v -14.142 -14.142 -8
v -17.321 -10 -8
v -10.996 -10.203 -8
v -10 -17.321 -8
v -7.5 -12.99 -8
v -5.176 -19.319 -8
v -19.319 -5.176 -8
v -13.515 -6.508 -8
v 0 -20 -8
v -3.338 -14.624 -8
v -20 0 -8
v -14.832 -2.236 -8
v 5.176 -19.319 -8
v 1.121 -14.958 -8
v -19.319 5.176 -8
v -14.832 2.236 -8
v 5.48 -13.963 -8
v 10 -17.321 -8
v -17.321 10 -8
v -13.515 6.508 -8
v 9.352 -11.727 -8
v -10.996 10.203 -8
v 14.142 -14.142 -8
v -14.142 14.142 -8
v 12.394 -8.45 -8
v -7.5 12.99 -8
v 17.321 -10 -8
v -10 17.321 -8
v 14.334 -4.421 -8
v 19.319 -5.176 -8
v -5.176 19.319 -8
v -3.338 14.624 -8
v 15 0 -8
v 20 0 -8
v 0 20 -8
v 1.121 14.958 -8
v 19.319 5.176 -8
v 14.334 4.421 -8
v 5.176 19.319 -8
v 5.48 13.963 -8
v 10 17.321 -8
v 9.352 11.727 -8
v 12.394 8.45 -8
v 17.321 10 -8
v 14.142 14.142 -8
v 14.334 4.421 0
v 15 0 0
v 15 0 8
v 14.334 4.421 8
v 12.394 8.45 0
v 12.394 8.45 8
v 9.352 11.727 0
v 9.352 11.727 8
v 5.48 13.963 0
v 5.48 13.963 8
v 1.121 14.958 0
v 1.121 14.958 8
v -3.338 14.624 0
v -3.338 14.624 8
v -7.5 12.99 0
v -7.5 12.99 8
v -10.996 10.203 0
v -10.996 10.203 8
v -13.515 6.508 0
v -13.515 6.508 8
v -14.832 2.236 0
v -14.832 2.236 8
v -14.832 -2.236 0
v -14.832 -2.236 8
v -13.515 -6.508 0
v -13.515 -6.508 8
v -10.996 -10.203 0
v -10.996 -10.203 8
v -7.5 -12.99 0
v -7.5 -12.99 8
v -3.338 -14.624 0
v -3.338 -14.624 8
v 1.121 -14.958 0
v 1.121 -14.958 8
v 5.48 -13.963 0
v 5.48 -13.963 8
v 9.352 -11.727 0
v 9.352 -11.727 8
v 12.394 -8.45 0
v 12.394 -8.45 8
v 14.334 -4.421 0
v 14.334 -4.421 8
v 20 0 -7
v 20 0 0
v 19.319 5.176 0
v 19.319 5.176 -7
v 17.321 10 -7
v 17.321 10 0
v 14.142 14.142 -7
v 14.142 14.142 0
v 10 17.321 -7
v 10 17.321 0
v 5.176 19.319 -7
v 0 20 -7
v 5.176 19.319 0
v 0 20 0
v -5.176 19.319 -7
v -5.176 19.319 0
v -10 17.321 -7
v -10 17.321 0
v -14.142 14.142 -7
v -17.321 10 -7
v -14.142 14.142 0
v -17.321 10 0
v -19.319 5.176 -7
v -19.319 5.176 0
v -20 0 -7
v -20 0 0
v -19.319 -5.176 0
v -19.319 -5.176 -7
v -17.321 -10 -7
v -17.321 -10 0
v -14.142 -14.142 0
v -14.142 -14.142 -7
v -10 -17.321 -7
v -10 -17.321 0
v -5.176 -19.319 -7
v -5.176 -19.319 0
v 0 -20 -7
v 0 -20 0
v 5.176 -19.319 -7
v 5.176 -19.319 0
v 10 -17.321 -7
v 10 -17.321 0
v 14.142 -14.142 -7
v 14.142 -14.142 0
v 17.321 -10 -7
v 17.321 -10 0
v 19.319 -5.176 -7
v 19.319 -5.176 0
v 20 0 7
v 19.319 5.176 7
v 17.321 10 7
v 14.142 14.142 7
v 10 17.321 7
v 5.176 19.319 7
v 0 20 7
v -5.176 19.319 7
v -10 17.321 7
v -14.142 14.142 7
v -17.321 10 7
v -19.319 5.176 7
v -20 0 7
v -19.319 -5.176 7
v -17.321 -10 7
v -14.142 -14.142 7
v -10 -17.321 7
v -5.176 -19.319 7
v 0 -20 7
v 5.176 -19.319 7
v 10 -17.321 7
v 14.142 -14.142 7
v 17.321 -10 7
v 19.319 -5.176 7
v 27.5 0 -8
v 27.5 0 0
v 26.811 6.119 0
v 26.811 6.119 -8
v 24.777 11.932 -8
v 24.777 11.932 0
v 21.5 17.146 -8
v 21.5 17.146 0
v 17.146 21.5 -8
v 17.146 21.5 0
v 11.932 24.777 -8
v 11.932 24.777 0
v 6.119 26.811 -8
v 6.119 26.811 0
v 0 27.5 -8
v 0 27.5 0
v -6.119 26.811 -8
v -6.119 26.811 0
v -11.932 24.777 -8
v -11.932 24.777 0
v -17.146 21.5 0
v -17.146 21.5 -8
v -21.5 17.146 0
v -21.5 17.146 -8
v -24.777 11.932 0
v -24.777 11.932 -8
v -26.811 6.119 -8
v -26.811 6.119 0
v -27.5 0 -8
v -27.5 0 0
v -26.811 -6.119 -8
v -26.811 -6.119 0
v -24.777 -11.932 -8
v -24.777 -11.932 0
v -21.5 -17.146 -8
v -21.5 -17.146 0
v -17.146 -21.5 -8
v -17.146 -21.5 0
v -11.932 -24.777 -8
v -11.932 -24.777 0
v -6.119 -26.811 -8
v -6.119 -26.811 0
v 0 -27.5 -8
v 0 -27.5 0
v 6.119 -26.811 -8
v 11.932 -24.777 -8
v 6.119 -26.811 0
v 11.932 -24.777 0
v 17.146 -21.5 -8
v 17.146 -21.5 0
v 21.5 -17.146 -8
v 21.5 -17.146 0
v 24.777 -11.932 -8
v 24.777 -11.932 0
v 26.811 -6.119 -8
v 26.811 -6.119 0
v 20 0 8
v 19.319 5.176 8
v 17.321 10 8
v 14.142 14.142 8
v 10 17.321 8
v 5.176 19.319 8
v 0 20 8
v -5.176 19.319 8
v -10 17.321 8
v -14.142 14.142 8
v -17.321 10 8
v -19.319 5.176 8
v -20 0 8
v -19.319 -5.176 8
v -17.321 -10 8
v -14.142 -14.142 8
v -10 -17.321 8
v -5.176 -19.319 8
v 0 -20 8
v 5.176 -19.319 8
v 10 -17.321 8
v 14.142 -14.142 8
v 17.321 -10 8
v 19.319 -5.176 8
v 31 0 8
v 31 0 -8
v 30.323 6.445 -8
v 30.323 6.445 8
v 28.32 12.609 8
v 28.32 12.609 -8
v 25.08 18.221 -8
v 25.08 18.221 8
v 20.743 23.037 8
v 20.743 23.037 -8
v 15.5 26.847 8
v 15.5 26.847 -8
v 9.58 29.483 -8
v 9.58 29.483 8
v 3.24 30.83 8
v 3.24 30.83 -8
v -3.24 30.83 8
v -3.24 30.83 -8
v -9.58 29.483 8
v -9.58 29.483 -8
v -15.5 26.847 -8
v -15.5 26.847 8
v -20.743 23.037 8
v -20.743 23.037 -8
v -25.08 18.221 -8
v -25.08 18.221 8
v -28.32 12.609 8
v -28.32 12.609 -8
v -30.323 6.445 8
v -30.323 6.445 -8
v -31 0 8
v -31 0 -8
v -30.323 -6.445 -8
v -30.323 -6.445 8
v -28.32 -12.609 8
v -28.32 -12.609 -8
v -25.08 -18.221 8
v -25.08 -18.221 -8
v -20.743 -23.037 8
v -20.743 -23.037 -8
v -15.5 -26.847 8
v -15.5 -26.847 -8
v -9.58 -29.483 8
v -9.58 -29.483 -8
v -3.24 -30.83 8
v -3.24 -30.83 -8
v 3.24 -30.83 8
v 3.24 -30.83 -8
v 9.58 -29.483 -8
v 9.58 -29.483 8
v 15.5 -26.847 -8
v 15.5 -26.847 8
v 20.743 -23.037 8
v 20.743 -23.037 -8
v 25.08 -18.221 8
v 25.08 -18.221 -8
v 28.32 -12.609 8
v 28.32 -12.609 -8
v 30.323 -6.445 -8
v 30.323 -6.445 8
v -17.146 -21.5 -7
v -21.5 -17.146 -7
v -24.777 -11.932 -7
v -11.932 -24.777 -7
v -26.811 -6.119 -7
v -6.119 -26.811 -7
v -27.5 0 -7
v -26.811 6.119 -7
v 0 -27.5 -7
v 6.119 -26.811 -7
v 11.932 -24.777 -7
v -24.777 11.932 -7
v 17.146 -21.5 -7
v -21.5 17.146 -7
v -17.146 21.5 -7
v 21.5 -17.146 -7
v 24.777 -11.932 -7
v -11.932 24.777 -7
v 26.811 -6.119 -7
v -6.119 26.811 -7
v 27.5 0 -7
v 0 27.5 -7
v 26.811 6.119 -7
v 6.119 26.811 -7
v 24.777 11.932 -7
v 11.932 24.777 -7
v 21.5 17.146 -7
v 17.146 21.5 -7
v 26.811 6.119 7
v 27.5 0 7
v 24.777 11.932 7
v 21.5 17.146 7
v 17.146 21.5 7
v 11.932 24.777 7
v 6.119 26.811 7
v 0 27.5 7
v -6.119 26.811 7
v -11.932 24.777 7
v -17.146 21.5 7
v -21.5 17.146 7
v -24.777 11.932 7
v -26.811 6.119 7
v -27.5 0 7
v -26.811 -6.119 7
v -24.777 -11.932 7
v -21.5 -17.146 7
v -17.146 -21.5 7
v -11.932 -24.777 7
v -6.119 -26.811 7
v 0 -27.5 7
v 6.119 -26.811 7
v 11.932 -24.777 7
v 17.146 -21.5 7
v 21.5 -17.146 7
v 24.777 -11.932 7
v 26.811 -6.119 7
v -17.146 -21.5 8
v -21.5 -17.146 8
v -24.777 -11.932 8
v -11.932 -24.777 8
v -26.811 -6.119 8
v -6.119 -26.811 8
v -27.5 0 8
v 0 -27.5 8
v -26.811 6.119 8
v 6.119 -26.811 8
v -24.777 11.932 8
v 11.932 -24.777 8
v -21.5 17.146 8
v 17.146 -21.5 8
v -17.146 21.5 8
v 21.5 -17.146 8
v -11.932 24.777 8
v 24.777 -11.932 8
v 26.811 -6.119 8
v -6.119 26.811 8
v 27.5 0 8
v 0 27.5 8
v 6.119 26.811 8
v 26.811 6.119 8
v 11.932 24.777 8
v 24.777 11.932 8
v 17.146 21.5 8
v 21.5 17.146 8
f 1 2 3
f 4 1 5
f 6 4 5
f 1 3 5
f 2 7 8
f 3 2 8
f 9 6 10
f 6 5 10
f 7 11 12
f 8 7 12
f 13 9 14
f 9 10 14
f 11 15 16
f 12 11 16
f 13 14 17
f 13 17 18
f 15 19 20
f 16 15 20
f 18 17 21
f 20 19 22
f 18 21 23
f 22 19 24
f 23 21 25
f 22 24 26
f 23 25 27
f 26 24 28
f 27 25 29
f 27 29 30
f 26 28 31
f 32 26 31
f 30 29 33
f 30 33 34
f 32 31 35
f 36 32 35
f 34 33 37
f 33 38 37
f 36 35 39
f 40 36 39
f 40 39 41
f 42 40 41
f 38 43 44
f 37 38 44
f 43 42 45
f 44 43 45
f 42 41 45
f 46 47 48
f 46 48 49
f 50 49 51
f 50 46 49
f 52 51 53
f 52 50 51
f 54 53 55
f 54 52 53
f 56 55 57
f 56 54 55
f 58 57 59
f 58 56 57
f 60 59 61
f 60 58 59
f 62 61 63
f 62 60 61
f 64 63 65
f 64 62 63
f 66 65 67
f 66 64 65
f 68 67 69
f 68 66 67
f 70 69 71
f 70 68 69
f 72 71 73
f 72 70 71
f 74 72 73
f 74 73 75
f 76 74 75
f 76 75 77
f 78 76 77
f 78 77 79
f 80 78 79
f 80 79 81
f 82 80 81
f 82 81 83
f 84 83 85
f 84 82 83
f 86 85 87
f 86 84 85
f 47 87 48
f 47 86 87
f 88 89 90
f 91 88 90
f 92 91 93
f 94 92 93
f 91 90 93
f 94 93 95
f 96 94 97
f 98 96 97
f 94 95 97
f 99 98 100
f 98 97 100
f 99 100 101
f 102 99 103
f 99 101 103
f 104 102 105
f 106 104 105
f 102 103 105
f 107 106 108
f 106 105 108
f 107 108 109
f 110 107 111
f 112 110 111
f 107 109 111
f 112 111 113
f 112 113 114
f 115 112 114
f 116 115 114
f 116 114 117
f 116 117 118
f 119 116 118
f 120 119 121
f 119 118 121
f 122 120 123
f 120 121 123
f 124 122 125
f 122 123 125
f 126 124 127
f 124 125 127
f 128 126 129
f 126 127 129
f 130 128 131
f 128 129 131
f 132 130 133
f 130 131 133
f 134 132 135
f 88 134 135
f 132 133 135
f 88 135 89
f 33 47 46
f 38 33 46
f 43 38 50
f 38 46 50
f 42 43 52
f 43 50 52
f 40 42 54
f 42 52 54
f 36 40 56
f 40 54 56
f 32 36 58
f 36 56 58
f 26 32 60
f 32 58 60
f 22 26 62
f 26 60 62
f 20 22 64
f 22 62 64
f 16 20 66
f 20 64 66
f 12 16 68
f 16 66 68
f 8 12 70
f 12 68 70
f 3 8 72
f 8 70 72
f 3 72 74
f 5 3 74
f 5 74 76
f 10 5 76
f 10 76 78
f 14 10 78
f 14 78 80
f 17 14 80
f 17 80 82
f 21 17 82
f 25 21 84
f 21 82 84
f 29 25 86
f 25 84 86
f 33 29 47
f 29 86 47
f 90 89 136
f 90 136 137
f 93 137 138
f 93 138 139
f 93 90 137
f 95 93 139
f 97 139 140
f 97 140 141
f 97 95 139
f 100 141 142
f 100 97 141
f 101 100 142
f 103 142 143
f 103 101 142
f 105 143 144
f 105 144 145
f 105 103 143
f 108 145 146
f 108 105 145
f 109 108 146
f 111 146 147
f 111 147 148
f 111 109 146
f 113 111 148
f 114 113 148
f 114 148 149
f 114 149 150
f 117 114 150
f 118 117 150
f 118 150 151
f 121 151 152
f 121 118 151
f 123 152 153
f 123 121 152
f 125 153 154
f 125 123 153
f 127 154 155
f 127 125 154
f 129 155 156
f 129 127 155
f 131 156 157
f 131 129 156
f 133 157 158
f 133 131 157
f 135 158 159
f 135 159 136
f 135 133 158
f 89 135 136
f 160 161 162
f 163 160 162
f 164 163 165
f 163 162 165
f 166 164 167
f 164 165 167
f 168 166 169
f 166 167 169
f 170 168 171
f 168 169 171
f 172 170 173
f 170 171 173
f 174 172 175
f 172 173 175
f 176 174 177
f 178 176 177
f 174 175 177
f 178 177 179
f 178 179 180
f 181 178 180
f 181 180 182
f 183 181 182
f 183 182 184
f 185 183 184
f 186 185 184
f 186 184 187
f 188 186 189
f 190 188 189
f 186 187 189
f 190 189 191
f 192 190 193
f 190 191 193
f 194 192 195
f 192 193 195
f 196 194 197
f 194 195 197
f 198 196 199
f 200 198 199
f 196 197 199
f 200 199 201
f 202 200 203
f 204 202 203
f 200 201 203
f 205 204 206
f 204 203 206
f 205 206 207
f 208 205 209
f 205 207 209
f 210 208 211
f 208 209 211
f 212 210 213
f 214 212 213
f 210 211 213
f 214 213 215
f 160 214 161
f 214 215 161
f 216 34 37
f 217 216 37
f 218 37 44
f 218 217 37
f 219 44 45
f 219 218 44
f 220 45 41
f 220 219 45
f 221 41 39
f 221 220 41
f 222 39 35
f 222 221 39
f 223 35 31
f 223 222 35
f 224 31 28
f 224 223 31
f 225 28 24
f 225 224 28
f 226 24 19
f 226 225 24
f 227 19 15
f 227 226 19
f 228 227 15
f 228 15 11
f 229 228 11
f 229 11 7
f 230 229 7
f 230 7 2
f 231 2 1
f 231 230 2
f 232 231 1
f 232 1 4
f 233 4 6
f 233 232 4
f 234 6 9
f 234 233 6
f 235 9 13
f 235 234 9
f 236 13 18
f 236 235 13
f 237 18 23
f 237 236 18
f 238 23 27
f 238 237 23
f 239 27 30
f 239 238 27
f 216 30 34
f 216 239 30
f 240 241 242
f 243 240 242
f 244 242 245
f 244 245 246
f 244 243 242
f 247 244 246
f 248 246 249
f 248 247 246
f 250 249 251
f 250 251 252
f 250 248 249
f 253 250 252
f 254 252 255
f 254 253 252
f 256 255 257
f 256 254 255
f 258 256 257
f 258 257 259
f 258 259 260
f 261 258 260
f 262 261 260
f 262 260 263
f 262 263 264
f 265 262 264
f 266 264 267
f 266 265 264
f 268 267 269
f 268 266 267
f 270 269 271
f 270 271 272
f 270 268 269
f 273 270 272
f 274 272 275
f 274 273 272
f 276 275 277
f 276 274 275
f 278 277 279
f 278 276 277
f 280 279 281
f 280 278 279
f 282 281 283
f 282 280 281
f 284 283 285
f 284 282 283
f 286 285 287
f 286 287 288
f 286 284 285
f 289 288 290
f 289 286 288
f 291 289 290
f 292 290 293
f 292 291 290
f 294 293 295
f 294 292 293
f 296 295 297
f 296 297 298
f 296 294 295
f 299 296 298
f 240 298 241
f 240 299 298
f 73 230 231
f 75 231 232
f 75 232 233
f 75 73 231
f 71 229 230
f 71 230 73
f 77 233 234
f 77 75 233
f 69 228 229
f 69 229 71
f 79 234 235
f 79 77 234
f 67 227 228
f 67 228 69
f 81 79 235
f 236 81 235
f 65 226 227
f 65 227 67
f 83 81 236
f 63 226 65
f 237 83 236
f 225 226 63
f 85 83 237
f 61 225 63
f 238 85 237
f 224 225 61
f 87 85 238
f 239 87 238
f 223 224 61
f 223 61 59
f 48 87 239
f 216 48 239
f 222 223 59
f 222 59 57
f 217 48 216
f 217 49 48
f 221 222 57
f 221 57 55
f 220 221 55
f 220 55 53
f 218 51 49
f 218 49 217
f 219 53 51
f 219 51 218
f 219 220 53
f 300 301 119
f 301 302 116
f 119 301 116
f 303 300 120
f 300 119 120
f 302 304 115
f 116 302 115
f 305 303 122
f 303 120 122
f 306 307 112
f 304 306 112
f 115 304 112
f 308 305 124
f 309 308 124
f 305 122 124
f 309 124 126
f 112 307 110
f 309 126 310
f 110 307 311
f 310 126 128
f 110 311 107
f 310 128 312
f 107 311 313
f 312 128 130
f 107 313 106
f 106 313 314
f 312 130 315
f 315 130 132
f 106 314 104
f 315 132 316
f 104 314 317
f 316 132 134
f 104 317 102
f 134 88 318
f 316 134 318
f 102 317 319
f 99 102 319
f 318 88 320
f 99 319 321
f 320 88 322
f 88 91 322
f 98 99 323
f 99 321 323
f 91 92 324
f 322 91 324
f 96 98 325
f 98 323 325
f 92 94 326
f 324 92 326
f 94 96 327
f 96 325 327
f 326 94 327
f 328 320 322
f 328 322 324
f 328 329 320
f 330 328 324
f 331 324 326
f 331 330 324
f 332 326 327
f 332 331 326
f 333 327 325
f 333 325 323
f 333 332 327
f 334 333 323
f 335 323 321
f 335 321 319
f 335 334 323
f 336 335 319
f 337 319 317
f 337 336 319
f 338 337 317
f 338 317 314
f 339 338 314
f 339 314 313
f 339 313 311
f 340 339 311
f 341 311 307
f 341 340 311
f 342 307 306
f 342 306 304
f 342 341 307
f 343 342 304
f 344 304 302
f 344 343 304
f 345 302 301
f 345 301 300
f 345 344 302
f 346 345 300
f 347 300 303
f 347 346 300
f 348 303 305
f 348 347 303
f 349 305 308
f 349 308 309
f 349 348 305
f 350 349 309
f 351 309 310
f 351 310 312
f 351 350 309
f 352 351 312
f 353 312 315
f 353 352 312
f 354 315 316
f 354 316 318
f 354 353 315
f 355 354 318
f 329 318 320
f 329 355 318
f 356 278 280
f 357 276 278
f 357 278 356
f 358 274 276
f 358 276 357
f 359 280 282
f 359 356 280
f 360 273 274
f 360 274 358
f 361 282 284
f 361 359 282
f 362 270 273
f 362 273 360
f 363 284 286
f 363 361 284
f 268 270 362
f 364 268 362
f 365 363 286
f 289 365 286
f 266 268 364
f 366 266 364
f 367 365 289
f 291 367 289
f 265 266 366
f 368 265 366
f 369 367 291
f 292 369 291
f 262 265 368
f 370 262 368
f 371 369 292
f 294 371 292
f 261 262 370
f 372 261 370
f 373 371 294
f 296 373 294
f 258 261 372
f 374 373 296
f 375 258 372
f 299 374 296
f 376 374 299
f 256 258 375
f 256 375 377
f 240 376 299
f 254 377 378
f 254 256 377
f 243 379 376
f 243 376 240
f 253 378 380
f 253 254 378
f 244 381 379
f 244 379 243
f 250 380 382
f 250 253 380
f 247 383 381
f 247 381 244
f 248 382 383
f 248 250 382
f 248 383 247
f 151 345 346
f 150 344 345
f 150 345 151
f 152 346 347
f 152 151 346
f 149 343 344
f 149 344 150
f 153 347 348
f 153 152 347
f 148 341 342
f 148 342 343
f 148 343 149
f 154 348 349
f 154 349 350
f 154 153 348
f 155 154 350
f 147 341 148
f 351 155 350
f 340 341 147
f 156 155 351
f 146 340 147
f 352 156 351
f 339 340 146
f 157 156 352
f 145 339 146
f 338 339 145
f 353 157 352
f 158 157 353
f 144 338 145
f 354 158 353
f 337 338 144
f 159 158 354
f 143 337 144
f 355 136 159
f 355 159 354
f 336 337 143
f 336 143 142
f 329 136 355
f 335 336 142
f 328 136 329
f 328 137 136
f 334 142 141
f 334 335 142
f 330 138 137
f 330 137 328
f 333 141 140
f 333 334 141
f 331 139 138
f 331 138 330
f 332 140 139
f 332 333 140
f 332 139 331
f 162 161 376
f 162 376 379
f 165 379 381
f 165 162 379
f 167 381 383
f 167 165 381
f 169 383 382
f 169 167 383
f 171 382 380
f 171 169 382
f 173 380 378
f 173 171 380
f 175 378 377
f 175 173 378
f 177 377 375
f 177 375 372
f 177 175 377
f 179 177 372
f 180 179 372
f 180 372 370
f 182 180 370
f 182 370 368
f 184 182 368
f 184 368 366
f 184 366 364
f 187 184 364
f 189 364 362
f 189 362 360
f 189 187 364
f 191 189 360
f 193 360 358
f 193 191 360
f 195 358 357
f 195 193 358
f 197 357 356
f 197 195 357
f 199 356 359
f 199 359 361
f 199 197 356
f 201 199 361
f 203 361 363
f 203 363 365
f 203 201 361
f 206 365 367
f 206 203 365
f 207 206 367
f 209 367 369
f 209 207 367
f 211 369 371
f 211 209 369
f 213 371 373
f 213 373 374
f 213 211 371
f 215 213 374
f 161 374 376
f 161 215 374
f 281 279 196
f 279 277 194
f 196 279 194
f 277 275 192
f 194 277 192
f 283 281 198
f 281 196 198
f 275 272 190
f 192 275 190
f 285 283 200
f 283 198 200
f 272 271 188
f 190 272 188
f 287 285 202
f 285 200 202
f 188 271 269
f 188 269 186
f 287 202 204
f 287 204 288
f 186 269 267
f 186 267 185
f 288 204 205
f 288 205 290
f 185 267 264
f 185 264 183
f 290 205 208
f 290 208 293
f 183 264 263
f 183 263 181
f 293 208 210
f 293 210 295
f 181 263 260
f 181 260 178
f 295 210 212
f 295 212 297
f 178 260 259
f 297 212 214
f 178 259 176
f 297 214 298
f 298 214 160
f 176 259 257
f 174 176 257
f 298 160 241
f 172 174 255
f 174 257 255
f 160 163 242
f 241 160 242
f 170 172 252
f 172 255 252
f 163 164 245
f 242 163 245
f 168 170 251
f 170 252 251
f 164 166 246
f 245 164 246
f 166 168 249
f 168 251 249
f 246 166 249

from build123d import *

# Parameters (mm, degrees)
F0_R          = 20
F0_R_2        = 15
F1_DEPTH      = 8
F1_DEPTH_BACK = 8
F0_R_3        = 31
F0_R_4        = 27.5
F2_DEPTH      = 7
F2_DEPTH_BACK = 7


with BuildPart() as f1:
    # F0 (on Top) → F1 (new body, two sides)
    with BuildSketch(Plane.XY) as f1_sk:
        Circle(F0_R)
        Circle(F0_R_2, mode=Mode.SUBTRACT)
    extrude(amount=F1_DEPTH)
    extrude(f1_sk.sketch, amount=-F1_DEPTH_BACK)


with BuildPart() as f1b:
    # F0 (on Top) → F1, piece 2 (new body, two sides)
    with BuildSketch(Plane.XY) as f1_2_sk:
        Circle(F0_R_3)
        Circle(F0_R_4, mode=Mode.SUBTRACT)
    extrude(amount=F1_DEPTH)
    extrude(f1_2_sk.sketch, amount=-F1_DEPTH_BACK)


with BuildPart() as f2:
    # F0 (on Top) → F2 (new body, two sides)
    with BuildSketch(Plane.XY) as f2_sk:
        Circle(F0_R_4)
        Circle(F0_R, mode=Mode.SUBTRACT)
    extrude(amount=F2_DEPTH)
    extrude(f2_sk.sketch, amount=-F2_DEPTH_BACK)


solid = Compound([f1.part, f1b.part, f2.part])
